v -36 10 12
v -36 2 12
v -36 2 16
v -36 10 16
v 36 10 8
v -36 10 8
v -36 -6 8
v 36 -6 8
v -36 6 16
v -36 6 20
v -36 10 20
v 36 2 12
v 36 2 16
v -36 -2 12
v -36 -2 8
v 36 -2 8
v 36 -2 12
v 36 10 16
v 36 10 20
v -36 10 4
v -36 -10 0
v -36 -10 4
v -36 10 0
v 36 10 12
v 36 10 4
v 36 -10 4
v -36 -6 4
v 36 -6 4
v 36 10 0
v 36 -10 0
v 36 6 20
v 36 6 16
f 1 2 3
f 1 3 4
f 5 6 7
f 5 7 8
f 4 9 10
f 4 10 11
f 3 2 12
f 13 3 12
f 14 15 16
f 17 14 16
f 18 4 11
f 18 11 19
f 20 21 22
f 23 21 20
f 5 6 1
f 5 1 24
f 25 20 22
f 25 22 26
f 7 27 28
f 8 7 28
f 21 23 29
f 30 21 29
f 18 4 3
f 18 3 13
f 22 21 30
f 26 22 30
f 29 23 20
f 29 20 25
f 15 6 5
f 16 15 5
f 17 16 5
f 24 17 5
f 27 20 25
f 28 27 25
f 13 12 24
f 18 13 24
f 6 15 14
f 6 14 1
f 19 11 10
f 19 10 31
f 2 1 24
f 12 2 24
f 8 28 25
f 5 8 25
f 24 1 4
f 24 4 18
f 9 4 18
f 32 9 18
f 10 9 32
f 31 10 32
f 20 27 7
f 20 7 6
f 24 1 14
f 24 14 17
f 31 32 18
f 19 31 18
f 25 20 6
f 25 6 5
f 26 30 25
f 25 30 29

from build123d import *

# Parameters (mm, degrees)
F0_W     = 72
F0_H     = 20
F1_DEPTH = 4
F2_W     = 72
F2_H     = 16
F3_DEPTH = 4
F4_W     = 72
F4_H     = 12
F5_DEPTH = 4
F6_W     = 72
F6_H     = 8
F7_DEPTH = 4
F8_W     = 72
F8_H     = 4
F9_DEPTH = 4


with BuildPart() as f1:
    # F0 (on Top) → F1 (new body)
    with BuildSketch(Plane.XY):
        Rectangle(F0_W, F0_H)
    extrude(amount=F1_DEPTH)


with BuildPart() as f3:
    # F2 (on face) → F3 (new body)
    with BuildSketch(Plane.XY.offset(4)):
        with Locations((0, 2)):
            Rectangle(F2_W, F2_H)
    extrude(amount=F3_DEPTH)


with BuildPart() as f5:
    # F4 (on face) → F5 (new body)
    with BuildSketch(Plane.XY.offset(8)):
        with Locations((0, 4)):
            Rectangle(F4_W, F4_H)
    extrude(amount=F5_DEPTH)


with BuildPart() as f7:
    # F6 (on face) → F7 (new body)
    with BuildSketch(Plane.XY.offset(12)):
        with Locations((0, 6)):
            Rectangle(F6_W, F6_H)
    extrude(amount=F7_DEPTH)


with BuildPart() as f9:
    # F8 (on face) → F9 (new body)
    with BuildSketch(Plane.XY.offset(16)):
        with Locations((0, 8)):
            Rectangle(F8_W, F8_H)
    extrude(amount=F9_DEPTH)


solid = Compound([f1.part, f3.part, f5.part, f7.part, f9.part])
